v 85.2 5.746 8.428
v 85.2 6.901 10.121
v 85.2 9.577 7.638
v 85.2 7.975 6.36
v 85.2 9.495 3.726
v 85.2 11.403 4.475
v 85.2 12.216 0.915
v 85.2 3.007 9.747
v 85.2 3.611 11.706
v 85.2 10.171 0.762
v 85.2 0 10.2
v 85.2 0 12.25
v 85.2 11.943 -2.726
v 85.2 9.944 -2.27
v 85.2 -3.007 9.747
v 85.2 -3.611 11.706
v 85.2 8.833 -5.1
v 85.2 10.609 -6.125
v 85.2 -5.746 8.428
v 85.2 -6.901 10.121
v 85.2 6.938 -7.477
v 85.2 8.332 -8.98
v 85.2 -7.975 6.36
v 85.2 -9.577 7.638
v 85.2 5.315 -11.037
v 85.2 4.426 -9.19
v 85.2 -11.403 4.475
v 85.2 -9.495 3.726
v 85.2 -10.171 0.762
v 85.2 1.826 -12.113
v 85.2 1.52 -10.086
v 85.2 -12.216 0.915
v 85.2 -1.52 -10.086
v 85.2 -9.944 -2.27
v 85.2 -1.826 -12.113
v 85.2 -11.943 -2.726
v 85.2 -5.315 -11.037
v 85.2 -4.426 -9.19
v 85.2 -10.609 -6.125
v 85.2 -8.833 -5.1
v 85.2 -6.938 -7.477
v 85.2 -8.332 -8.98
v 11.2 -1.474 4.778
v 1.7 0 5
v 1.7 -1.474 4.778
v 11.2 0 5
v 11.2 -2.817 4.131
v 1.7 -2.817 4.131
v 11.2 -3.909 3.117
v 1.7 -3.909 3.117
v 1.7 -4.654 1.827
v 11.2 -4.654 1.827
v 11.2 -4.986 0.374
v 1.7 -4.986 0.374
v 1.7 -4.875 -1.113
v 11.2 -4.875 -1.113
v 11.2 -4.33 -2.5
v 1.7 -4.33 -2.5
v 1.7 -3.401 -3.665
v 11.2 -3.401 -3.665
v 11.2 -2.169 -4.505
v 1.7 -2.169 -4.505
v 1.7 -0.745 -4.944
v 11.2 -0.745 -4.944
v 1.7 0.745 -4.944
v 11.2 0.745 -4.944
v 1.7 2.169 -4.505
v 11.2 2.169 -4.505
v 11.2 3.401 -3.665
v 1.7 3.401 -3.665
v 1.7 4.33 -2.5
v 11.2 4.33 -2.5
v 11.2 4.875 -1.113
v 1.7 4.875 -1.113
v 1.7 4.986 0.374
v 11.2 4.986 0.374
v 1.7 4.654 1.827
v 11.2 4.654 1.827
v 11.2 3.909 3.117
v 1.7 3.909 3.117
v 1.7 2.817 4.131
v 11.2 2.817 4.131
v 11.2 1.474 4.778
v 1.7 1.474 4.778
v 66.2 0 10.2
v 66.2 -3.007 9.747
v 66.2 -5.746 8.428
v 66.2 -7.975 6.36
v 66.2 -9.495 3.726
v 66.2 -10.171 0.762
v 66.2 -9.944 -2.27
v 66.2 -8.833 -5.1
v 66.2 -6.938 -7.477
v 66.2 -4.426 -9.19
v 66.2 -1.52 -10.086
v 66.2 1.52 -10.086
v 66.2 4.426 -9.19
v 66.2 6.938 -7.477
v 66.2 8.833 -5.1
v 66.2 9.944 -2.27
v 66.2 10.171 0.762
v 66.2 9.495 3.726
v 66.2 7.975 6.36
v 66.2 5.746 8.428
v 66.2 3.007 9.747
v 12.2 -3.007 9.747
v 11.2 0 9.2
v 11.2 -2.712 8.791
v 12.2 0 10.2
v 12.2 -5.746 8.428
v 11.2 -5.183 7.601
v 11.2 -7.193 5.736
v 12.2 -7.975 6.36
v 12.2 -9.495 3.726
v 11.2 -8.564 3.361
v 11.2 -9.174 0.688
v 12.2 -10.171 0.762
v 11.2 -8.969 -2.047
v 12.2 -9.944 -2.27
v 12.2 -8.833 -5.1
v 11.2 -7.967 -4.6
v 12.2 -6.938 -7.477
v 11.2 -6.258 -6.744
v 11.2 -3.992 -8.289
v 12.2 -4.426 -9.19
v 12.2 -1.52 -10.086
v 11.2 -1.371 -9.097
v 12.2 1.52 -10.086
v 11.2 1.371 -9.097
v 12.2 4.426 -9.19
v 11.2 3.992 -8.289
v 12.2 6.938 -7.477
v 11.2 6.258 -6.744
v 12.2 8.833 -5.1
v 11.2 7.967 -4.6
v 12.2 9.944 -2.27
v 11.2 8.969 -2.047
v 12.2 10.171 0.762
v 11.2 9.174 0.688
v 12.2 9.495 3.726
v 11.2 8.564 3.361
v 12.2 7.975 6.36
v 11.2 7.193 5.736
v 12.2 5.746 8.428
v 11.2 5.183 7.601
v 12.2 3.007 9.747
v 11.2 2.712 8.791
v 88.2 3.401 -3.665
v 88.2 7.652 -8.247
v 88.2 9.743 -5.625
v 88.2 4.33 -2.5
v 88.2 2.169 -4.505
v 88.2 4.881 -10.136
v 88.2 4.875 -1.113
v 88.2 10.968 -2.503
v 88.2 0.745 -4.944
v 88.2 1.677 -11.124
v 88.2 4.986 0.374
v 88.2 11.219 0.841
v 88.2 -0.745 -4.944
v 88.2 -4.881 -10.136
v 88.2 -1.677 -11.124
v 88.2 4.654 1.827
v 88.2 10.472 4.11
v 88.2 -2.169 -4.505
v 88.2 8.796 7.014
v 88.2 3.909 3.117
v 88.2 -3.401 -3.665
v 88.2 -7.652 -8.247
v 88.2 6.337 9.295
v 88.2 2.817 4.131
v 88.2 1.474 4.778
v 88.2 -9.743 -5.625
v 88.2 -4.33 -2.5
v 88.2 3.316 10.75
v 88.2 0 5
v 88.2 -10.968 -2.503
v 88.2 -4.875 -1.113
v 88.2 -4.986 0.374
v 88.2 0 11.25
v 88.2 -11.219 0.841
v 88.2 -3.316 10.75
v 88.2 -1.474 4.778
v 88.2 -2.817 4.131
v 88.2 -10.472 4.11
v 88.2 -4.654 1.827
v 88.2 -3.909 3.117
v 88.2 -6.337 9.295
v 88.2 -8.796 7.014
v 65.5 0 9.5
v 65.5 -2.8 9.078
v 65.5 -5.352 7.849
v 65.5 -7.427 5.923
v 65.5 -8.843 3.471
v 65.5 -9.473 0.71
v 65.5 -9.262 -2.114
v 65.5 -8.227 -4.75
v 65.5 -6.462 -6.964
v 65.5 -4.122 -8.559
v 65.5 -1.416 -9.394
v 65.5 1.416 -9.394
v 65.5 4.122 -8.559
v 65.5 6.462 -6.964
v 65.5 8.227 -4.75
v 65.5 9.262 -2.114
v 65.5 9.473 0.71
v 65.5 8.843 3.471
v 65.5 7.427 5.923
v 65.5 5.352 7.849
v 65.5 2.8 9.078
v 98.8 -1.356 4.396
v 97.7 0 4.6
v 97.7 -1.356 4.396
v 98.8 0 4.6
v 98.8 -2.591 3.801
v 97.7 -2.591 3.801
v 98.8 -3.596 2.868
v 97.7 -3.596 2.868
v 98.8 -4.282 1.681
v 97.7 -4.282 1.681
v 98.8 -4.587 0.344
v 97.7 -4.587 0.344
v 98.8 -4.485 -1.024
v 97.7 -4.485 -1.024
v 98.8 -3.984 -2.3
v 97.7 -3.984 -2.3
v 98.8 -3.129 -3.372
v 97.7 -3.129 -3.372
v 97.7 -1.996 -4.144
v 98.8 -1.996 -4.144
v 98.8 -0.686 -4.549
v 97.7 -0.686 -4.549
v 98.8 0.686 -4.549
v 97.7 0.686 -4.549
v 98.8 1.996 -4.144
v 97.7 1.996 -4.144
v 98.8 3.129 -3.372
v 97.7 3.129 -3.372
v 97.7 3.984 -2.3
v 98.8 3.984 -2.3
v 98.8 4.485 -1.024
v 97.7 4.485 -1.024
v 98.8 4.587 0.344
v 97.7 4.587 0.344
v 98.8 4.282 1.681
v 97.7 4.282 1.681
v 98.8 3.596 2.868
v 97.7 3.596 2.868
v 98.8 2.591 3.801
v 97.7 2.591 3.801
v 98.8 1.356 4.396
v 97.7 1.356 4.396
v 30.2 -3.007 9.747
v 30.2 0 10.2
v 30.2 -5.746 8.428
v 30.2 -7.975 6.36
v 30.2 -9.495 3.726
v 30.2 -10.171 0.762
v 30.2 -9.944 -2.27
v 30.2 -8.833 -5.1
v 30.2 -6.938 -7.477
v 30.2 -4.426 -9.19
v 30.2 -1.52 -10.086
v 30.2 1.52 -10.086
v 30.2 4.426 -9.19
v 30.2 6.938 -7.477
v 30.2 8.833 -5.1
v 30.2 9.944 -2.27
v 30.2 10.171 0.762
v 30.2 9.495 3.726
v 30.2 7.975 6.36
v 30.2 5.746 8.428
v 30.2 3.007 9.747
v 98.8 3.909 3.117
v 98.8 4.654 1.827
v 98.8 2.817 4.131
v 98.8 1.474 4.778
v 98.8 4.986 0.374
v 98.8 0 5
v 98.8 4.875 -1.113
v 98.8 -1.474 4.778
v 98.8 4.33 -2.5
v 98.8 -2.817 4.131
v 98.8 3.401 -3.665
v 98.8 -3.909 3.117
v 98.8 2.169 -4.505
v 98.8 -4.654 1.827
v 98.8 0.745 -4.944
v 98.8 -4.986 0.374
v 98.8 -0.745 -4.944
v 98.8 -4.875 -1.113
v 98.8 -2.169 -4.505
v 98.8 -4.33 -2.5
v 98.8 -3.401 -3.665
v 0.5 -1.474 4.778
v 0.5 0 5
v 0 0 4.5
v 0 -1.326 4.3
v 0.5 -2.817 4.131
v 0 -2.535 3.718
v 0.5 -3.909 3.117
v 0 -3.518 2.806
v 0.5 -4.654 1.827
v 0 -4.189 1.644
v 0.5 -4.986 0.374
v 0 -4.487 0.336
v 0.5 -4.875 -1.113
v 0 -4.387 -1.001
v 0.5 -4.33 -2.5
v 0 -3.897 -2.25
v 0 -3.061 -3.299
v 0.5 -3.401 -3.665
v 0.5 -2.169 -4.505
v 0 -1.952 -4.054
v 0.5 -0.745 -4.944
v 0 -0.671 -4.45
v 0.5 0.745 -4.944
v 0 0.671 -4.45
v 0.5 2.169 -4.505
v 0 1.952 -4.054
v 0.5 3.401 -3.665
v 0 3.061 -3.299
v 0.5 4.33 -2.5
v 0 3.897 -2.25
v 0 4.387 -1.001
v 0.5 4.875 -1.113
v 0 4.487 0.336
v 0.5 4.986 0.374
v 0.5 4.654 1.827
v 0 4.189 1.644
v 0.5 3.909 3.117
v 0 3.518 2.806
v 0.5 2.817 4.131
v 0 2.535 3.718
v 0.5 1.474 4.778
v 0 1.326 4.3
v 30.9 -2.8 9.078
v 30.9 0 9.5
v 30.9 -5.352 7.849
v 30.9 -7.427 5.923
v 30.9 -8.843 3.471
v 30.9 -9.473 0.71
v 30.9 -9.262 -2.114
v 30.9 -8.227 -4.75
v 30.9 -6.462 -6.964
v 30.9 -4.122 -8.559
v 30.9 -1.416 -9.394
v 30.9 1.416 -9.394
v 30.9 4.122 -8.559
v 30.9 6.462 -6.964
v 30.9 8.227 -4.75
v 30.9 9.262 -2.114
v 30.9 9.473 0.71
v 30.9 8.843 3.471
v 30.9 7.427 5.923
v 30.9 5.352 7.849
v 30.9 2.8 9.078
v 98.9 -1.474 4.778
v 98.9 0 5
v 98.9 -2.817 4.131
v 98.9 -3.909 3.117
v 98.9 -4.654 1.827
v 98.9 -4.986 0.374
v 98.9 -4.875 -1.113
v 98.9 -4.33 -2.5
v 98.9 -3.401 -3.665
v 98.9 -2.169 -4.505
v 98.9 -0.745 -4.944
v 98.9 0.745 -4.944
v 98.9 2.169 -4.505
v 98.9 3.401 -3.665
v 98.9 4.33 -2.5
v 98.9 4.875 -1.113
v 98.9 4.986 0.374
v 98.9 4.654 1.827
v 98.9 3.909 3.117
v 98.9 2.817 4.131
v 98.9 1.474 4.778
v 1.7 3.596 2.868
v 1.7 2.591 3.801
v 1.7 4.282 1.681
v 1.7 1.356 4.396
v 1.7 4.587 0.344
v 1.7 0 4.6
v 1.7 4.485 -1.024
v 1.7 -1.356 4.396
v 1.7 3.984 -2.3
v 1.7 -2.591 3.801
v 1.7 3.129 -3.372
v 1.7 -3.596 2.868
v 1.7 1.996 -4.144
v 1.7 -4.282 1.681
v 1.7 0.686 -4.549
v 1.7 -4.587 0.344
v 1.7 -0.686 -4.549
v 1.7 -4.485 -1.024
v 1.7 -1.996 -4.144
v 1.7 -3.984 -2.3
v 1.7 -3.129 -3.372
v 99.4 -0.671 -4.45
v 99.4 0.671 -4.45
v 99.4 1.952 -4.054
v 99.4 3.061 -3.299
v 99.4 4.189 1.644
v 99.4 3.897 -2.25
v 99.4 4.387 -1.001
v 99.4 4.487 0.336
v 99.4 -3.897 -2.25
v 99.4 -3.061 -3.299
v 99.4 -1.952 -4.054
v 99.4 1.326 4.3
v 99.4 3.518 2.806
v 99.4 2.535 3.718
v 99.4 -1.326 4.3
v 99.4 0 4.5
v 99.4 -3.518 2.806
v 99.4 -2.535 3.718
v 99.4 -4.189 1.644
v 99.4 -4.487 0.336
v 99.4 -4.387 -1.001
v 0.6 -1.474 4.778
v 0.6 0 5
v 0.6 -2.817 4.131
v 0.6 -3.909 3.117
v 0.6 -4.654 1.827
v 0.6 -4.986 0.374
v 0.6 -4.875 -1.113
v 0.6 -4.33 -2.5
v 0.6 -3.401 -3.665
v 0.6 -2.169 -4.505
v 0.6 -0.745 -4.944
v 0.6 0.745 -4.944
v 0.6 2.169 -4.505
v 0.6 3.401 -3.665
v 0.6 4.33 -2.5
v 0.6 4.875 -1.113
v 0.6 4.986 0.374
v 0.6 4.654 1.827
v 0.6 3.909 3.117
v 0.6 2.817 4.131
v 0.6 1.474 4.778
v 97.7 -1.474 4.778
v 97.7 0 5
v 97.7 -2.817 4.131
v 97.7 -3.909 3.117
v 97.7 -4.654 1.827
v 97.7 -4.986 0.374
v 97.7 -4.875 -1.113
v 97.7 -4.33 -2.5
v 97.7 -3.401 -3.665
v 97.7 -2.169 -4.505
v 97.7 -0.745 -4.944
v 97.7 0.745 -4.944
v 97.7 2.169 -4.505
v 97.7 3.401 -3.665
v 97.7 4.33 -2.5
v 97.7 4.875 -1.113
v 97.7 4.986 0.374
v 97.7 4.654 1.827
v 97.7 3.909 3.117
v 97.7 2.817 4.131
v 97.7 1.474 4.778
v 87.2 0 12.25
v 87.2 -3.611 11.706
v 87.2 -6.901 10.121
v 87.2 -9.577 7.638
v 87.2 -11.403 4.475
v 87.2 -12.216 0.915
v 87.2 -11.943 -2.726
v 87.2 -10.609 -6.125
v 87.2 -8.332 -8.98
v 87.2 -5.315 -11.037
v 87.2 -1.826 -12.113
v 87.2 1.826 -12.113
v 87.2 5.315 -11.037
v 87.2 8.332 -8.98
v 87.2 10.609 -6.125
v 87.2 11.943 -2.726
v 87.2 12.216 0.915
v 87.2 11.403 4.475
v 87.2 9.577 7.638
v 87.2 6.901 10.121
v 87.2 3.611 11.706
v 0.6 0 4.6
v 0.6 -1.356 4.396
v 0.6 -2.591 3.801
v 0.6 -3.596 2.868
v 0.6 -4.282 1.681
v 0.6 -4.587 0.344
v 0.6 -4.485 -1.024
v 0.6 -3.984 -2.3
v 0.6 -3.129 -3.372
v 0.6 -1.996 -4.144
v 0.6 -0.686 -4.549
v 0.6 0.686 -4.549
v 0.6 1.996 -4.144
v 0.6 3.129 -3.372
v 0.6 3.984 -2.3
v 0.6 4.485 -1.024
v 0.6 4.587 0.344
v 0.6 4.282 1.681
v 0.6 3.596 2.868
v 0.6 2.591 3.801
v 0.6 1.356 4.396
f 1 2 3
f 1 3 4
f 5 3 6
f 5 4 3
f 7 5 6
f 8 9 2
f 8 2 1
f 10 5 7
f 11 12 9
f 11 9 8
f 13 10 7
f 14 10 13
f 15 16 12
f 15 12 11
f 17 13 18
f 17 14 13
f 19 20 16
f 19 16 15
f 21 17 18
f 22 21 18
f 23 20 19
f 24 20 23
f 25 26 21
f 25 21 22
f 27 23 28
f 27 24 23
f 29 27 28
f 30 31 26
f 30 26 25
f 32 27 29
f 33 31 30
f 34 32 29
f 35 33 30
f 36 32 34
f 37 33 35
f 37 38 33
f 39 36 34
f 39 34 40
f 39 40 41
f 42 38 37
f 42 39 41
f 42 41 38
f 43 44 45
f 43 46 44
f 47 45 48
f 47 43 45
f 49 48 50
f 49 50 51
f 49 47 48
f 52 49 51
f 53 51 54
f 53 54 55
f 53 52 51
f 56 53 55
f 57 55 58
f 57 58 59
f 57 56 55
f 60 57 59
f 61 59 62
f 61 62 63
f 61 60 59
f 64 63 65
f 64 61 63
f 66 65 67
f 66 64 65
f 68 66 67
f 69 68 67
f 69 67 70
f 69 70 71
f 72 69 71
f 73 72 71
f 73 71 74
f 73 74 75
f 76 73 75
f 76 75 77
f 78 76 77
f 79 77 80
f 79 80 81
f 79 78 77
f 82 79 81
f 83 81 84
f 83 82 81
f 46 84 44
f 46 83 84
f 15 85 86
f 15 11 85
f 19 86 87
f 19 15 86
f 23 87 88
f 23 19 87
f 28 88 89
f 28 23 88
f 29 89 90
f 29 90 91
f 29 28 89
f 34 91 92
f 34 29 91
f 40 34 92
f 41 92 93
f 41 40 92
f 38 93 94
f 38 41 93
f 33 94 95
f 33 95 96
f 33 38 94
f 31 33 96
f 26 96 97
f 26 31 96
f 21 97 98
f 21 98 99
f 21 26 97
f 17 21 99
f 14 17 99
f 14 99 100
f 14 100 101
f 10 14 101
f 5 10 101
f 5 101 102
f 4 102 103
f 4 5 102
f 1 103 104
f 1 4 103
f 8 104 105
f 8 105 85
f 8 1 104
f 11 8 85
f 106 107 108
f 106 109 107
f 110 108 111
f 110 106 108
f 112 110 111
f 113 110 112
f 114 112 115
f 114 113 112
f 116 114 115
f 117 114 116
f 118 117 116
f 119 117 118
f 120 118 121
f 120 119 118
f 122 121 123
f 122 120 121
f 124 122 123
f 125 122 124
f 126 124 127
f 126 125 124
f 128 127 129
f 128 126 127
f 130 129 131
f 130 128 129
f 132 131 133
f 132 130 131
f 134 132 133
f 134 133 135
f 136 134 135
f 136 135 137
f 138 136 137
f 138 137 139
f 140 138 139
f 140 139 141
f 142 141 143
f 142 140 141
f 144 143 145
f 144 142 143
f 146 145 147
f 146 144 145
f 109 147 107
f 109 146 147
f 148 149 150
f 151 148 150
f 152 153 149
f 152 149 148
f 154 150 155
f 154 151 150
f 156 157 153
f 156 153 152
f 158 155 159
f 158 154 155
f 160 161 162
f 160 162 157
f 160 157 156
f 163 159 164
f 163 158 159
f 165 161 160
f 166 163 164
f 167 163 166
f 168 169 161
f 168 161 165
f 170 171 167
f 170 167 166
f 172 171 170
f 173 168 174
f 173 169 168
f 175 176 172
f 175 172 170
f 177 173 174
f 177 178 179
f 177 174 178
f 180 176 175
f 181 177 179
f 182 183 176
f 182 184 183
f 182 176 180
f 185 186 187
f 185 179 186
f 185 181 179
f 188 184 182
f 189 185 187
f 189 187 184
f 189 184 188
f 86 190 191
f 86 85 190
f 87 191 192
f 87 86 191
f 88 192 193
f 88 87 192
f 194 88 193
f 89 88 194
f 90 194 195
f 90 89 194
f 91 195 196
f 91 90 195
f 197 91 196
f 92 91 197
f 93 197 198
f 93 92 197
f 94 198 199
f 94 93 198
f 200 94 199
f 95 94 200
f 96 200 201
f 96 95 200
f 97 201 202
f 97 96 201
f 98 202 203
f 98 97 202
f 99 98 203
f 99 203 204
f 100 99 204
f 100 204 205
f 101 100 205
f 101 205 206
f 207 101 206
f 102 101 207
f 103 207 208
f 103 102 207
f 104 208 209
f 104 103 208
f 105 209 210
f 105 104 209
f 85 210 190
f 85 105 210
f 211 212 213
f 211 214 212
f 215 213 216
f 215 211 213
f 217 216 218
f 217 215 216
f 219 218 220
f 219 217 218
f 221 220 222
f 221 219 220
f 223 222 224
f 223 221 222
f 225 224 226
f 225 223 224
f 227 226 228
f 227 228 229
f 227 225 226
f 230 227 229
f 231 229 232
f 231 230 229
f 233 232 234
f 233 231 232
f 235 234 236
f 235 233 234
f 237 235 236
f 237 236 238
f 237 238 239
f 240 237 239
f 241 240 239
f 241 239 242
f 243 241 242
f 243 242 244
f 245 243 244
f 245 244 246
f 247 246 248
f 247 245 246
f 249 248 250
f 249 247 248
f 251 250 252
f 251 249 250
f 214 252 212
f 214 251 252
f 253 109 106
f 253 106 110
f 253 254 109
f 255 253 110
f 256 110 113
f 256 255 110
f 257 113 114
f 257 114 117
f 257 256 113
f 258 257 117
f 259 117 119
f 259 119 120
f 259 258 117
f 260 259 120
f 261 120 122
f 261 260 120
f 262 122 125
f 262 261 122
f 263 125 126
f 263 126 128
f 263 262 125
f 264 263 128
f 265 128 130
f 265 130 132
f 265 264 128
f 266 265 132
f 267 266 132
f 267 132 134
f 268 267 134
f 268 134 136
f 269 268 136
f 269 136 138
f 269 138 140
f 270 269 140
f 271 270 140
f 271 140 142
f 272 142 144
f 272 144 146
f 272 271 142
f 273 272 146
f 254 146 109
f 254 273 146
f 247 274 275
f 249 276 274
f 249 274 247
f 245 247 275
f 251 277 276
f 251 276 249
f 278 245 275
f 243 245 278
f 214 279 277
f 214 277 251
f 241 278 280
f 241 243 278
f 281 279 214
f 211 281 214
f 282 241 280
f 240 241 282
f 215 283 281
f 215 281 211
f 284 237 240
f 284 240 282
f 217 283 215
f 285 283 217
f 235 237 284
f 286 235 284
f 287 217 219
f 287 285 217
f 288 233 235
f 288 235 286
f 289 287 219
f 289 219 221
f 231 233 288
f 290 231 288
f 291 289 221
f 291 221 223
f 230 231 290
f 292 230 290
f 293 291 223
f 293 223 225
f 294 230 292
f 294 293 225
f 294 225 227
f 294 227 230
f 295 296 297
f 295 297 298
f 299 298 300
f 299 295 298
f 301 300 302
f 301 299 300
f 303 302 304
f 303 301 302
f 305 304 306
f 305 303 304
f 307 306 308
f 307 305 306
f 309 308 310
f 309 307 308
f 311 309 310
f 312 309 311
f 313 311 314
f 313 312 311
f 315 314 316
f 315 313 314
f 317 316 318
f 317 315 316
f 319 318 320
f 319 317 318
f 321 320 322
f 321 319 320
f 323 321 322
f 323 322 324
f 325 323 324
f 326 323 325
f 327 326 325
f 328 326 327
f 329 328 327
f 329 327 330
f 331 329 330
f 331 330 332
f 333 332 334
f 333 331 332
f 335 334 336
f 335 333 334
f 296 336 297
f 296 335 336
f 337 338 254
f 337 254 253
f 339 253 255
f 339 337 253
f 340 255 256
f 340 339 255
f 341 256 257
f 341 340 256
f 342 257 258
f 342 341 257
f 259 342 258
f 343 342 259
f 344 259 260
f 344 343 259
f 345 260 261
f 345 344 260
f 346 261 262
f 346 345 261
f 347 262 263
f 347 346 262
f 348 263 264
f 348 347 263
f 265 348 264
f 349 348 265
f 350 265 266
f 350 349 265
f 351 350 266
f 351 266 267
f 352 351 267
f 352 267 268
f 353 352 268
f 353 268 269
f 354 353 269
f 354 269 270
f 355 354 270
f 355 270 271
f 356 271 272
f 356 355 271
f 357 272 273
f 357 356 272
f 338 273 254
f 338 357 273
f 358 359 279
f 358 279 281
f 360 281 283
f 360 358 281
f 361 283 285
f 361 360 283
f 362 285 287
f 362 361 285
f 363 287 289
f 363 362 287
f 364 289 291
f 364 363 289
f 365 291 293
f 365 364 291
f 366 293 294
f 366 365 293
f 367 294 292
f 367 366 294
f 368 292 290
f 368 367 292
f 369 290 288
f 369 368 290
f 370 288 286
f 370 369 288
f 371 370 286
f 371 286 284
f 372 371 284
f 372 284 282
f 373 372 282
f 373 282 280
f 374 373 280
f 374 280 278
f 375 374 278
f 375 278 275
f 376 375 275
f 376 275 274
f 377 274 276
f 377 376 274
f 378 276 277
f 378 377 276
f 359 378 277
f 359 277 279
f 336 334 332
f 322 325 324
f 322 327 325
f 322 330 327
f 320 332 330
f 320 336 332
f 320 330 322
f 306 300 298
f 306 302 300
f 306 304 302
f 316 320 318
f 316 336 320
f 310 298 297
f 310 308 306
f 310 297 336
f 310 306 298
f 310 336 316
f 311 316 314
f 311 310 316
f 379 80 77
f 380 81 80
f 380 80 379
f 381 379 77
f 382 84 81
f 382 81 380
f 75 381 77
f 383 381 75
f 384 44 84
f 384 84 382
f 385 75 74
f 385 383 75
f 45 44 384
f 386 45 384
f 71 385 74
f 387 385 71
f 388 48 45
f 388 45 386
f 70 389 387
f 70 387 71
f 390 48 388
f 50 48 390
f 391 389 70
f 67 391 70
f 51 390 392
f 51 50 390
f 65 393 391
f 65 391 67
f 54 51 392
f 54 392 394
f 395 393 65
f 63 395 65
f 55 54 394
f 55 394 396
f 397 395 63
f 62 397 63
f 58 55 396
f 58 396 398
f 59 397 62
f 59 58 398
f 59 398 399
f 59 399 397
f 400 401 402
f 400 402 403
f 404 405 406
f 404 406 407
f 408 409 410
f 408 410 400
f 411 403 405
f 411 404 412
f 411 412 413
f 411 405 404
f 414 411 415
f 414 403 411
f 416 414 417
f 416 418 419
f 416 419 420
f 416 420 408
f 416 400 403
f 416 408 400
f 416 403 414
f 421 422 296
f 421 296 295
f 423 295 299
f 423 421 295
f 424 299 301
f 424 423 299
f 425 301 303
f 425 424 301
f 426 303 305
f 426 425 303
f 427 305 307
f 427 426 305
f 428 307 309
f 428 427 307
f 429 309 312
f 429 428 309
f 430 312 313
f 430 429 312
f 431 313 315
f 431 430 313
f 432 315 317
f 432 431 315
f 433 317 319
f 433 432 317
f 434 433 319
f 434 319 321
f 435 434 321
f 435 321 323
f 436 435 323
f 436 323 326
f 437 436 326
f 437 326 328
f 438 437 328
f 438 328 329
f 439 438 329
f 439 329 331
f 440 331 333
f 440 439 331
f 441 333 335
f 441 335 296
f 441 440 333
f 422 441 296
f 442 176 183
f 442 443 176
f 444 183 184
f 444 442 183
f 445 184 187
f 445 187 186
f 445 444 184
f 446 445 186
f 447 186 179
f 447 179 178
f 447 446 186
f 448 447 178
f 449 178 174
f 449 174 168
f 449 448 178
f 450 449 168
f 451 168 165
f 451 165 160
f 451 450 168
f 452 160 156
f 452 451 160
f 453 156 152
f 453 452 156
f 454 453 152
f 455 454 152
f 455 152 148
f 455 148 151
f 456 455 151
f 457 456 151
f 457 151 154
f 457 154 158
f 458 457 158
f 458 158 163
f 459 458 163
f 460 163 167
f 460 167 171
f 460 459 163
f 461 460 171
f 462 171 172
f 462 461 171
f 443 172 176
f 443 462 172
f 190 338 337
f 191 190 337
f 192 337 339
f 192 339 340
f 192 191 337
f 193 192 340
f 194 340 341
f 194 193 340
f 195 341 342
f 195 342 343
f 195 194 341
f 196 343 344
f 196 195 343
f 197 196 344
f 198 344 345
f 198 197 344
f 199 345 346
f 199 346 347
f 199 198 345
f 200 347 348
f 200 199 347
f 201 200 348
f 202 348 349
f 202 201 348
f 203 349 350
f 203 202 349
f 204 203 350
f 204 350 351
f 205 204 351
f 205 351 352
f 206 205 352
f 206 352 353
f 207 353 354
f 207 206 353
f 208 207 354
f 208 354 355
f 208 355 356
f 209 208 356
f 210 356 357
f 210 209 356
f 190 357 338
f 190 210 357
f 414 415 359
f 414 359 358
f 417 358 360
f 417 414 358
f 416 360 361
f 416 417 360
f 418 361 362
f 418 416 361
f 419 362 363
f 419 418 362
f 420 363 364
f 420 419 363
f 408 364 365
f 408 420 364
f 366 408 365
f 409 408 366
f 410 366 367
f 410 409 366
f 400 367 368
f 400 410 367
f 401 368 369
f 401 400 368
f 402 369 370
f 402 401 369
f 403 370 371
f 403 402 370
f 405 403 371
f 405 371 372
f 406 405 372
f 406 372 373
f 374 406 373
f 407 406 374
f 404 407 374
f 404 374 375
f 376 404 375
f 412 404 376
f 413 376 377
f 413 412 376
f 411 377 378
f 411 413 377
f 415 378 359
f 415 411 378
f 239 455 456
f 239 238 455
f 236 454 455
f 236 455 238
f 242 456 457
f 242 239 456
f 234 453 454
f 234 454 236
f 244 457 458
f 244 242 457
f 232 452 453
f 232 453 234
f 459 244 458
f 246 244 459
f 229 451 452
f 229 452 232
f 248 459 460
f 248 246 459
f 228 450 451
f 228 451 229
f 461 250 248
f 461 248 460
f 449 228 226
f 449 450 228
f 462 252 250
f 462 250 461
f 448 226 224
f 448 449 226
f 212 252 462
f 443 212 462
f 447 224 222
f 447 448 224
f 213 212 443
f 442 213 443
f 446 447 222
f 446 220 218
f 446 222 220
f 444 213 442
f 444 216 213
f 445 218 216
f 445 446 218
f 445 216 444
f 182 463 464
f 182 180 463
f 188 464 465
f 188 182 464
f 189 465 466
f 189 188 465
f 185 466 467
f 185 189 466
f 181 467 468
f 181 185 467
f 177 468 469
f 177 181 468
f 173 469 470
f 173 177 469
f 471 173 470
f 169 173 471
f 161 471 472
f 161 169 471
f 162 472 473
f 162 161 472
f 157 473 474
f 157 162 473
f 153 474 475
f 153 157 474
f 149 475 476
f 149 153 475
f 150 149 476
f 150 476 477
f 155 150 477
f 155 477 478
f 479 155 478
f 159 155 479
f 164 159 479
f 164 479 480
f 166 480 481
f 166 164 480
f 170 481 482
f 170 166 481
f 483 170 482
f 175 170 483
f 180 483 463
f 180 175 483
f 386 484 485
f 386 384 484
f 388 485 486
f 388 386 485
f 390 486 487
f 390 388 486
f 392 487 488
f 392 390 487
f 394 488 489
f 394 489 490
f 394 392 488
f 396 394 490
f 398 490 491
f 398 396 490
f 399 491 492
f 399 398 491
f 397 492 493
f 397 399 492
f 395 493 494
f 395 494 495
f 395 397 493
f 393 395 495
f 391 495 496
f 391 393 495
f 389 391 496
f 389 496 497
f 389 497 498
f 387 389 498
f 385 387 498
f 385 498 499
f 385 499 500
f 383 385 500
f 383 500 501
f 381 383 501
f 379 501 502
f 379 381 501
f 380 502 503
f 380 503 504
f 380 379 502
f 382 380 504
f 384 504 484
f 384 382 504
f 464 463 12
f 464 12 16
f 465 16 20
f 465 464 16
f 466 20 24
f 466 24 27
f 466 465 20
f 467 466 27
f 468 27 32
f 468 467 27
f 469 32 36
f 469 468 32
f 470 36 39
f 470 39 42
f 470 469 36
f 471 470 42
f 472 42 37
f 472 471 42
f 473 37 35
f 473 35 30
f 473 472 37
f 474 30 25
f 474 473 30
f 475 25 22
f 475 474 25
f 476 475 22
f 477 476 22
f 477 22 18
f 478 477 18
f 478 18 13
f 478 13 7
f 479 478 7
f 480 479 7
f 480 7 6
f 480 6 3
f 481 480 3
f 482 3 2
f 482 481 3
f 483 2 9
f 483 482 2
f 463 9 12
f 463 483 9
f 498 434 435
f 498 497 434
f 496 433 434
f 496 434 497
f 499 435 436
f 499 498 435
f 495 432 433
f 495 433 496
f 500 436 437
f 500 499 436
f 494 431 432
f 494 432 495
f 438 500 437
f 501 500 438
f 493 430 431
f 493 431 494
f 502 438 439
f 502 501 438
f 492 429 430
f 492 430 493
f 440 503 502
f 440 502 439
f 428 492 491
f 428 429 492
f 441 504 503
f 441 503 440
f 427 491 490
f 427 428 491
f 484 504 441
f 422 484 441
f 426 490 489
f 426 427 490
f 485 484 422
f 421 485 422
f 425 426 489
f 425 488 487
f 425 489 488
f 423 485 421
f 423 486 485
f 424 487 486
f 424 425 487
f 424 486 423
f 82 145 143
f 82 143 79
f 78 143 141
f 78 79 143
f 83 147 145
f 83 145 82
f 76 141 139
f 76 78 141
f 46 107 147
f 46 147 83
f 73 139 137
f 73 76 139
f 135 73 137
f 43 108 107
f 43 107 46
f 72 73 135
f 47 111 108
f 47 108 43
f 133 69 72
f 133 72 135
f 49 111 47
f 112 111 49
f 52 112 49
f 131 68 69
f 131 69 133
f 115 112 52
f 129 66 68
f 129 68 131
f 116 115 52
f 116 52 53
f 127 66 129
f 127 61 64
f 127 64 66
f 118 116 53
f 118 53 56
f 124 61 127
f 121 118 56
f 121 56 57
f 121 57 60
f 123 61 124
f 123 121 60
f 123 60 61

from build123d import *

# Parameters (mm, degrees)
SFAZOWANIE1_SIZE = 1
SFAZOWANIE2_SIZE = 0.5


with BuildPart() as part:
    # Szkic1 → Obrót1 (revolve)
    with BuildSketch(Plane.XY, mode=Mode.PRIVATE) as obr_t1_sk:
        Polygon((0, 0), (0, 5), (0.6, 5), (0.6, 4.6), (1.7, 4.6), (1.7, 5), (11.2, 5), (11.2, 10.2), (31.2, 10.2), (31.2, 9.5), (65.2, 9.5), (65.2, 10.2), (85.2, 10.2), (85.2, 12.25), (88.2, 12.25), (88.2, 5), (97.7, 5), (97.7, 4.6), (98.8, 4.6), (98.8, 5), (99.4, 5), (99.4, 0), align=None)
    revolve(obr_t1_sk.sketch.rotate(Axis((-10.674656103, 0, 0), (1, 0, 0)), 90), axis=Axis((-10.674656103, 0, 0), (1, 0, 0)))

    # Sfazowanie1
    # the kernel refuses this chamfer: 1 mm, written as the material it takes off along each edge
    with BuildSketch(Plane(origin=(65.2, 0, 0), x_dir=(0, 0, 1), z_dir=(0, 1, 0))) as sfazowanie1_piece_1_section:
        Polygon((10.2 - SFAZOWANIE1_SIZE, 0), (10.2, SFAZOWANIE1_SIZE), (10.2, 0), align=None)
    sfazowanie1_piece_1 = revolve(axis=Axis((65.2, 0, 0), (1, 0, 0)), mode=Mode.PRIVATE)
    sfazowanie1_piece_1 = sfazowanie1_piece_1 - Plane(origin=(65.841981052, 0, 0), x_dir=(0, 0, 1), z_dir=(1, 0, 0)) * Cylinder(9.5, 41, mode=Mode.PRIVATE)
    add(sfazowanie1_piece_1, mode=Mode.SUBTRACT)
    with BuildSketch(Plane(origin=(31.2, 0, 0), x_dir=(0, 0, 1), z_dir=(0, 1, 0))) as sfazowanie1_piece_2_section:
        Polygon((10.2, -SFAZOWANIE1_SIZE), (10.2 - SFAZOWANIE1_SIZE, 0), (10.2, 0), align=None)
    sfazowanie1_piece_2 = revolve(axis=Axis((31.2, 0, 0), (1, 0, 0)), mode=Mode.PRIVATE)
    sfazowanie1_piece_2 = sfazowanie1_piece_2 - Plane(origin=(30.558018948, 0, 0), x_dir=(0, 0, 1), z_dir=(1, 0, 0)) * Cylinder(9.5, 41, mode=Mode.PRIVATE)
    add(sfazowanie1_piece_2, mode=Mode.SUBTRACT)
    with BuildSketch(Plane(origin=(88.2, 0, 0), x_dir=(0, 0, 1), z_dir=(0, 1, 0))) as sfazowanie1_piece_3:
        Polygon((12.25, -SFAZOWANIE1_SIZE), (12.25 - SFAZOWANIE1_SIZE, 0), (12.25, 0), align=None)
    revolve(axis=Axis((88.2, 0, 0), (1, 0, 0)), mode=Mode.SUBTRACT)
    with BuildSketch(Plane(origin=(11.2, 0, 0), x_dir=(0, 0, 1), z_dir=(0, 1, 0))) as sfazowanie1_piece_4:
        Polygon((10.2 - SFAZOWANIE1_SIZE, 0), (10.2, SFAZOWANIE1_SIZE), (10.2, 0), align=None)
    revolve(axis=Axis((11.2, 0, 0), (1, 0, 0)), mode=Mode.SUBTRACT)

    # Sfazowanie2
    sfazowanie2_edges = [part.edges().sort_by_distance(p)[0] for p in [
        (99.4, 0, -5),
        (0, 0, -5),
    ]]
    chamfer(sfazowanie2_edges, length=SFAZOWANIE2_SIZE)


solid = part.part
